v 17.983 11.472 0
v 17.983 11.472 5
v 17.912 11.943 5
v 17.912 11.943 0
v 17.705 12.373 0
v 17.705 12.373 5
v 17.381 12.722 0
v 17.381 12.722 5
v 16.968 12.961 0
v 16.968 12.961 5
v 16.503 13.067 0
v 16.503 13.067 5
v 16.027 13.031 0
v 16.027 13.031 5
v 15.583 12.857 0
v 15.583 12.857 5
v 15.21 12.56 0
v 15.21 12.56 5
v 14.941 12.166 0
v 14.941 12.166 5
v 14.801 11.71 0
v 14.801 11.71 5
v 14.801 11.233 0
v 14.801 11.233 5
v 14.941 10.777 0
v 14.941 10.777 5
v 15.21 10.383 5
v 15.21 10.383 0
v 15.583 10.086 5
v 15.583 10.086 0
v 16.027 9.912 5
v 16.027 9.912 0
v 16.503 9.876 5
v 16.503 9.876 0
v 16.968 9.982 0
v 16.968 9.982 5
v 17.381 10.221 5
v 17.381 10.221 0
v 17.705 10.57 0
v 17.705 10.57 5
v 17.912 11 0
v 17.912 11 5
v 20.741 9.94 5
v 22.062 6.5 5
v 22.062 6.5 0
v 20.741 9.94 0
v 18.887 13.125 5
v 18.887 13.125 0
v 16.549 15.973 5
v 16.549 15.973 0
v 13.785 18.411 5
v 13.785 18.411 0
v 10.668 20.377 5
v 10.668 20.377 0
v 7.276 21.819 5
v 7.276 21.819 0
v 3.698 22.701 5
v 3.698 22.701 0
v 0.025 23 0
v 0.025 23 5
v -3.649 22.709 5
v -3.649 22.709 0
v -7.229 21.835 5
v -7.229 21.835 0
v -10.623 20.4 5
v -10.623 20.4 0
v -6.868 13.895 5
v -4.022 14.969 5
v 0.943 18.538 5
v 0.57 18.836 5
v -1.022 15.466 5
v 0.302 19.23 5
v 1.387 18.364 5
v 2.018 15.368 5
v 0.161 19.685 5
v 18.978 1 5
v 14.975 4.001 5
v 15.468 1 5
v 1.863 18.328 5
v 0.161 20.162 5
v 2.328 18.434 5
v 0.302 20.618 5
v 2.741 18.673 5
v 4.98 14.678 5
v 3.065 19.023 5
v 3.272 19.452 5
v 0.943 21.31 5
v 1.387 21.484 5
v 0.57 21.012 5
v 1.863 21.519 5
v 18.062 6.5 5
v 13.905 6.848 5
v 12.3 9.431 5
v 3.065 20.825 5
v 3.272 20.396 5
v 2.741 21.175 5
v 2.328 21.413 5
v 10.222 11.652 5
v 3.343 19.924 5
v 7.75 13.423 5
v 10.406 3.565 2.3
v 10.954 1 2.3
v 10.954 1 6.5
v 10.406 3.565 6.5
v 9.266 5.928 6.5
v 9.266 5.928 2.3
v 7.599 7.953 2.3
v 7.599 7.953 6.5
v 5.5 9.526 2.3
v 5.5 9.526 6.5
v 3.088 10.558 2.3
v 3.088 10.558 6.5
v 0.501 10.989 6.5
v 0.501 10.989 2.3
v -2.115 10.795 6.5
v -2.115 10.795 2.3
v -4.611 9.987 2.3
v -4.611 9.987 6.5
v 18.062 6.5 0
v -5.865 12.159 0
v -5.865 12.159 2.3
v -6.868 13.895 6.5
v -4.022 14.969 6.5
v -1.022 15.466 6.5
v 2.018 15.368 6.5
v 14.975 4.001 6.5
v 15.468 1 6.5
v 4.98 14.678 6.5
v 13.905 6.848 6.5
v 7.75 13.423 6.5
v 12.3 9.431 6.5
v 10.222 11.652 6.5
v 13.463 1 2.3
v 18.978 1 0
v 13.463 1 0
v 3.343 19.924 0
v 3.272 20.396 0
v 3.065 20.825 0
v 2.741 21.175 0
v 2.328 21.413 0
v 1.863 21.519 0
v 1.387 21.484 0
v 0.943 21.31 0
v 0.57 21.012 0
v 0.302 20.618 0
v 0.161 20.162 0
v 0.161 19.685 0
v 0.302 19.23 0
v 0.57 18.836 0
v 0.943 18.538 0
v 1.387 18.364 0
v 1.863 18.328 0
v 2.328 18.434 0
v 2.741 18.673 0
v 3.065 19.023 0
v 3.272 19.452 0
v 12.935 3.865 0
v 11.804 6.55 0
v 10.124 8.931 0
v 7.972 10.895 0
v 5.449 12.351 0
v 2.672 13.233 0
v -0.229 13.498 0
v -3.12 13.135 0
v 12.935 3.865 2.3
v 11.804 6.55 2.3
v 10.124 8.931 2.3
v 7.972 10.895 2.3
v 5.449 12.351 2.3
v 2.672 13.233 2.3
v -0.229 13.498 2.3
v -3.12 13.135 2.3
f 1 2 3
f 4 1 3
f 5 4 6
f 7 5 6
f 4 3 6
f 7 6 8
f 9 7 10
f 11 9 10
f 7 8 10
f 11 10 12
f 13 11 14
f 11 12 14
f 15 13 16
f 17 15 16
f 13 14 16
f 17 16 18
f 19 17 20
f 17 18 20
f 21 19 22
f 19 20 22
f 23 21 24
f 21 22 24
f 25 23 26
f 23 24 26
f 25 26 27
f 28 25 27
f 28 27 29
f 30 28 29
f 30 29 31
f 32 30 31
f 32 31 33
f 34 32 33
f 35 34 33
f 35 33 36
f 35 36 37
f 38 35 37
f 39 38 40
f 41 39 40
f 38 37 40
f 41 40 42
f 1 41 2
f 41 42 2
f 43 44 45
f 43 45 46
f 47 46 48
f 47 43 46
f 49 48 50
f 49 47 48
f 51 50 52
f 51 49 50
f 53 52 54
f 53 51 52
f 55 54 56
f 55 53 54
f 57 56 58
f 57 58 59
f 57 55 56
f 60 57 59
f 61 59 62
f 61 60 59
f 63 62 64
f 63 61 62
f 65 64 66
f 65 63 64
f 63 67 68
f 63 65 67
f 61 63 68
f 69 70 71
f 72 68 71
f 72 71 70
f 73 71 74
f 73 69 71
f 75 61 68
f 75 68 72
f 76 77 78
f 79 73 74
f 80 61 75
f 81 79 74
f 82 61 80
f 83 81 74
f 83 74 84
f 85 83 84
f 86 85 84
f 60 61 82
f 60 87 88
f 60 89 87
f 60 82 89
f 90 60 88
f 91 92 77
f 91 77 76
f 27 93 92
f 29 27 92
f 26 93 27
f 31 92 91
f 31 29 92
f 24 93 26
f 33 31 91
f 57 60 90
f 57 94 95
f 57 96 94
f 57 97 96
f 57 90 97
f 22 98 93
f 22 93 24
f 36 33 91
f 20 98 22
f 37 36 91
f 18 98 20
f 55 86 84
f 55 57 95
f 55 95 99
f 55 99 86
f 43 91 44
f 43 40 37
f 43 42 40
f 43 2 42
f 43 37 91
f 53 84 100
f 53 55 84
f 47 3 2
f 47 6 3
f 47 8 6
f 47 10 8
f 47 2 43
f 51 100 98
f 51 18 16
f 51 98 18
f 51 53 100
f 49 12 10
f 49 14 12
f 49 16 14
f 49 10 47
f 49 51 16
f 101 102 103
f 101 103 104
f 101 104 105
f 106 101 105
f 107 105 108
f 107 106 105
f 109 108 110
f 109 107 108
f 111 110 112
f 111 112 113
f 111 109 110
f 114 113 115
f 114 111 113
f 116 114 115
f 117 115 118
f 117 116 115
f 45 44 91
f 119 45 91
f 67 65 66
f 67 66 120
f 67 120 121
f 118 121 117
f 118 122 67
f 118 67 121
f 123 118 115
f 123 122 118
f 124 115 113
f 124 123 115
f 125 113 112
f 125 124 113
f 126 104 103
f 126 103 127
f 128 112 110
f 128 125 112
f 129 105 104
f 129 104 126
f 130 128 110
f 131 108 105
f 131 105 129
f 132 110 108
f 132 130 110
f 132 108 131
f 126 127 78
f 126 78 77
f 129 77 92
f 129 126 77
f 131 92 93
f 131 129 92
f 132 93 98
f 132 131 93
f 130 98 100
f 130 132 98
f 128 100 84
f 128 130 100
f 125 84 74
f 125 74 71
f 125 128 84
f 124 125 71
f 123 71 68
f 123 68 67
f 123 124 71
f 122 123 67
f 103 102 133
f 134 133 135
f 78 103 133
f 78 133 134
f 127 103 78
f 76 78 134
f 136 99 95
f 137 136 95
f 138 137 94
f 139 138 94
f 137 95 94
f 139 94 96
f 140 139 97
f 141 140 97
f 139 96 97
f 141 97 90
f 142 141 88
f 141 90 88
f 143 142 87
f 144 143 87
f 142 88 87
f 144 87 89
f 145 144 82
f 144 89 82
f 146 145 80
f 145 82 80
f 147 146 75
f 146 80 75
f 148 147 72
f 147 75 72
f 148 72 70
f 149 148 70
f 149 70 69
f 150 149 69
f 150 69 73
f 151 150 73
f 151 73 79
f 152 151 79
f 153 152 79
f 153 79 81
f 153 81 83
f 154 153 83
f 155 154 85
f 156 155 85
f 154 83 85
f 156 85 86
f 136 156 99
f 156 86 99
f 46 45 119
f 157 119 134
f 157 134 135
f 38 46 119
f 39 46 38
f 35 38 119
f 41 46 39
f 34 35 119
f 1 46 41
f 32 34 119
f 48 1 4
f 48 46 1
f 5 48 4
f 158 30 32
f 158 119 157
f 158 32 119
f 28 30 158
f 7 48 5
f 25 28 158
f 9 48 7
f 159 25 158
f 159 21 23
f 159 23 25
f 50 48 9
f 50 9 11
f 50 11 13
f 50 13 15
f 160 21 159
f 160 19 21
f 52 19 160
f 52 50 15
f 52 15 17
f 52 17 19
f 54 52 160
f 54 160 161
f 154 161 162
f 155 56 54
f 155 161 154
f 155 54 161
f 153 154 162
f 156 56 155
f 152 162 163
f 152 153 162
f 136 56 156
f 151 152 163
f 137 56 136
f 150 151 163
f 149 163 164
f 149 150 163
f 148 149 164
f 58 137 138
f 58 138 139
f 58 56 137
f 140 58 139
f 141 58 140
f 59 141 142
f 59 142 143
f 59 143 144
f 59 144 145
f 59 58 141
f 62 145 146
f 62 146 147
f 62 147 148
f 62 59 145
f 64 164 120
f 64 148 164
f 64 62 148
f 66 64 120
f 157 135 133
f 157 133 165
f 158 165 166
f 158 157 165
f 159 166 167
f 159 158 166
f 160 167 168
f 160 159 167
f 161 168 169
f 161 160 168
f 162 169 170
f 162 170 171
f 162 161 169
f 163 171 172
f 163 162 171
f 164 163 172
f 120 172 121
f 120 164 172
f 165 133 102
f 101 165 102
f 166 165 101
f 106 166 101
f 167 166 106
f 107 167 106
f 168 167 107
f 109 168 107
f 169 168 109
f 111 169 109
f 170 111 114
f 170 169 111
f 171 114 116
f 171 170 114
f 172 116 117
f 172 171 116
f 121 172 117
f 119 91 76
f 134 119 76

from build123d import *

# Parameters (mm, degrees)
F1_ANGLE  = 120
F2_R      = 1.6
F3_DEPTH  = 5
F6_W      = 12.938
F6_H      = 7.452
F7_DEPTH  = 1
F8_W      = 13.007
F8_H      = 7.97
F9_DEPTH  = 1
F11_DEPTH = 5


with BuildPart() as f1:
    # F0 (on Front) → F1 (revolve)
    with BuildSketch(Plane.XZ):
        Polygon((23, 5), (15.5, 5), (15.5, 6.5), (11, 6.5), (11, 2.3), (13.5, 2.3), (13.5, 0), (23, 0), align=None)
    revolve(axis=Axis((0, 0, 3.7848940119), (0, 0, 1)), revolution_arc=F1_ANGLE)

    # F2 (on face) → F3 (cut, through all)
    with BuildSketch(Plane.XY.offset(5)):
        with Locations((1.743114855, 19.9238939618)):
            Circle(F2_R)
        with Locations((16.3830408858, 11.471528727)):
            Circle(F2_R)
    extrude(amount=-F3_DEPTH, mode=Mode.SUBTRACT)

    # F6 (on offset) → F7 (cut, through all)
    with BuildSketch(Plane.XZ.offset(-1)):
        with Locations((17.1259158669, 3.1437808403)):
            Rectangle(F6_W, F6_H)
    extrude(amount=F7_DEPTH, mode=Mode.SUBTRACT)

    # F8 (on offset) → F9 (cut, through all)
    with BuildSketch(Plane(origin=(0.8660254038, 0.5, 0), x_dir=(0.5, -0.8660254038, 0), z_dir=(-0.8660254038, -0.5, 0))):
        with Locations((-17.1034485545, 3.2673813227)):
            Rectangle(F8_W, F8_H)
    extrude(amount=F9_DEPTH, mode=Mode.SUBTRACT)

    # F10 (on face) → F11 (cut, through all)
    with BuildSketch(Plane.XY.offset(5)):
        with BuildLine():
            Line((18.9782505862, 1), (22.9782505862, 1))
            ThreePointArc((22.9782505862, 1), (22.6876135739, 3.777855254), (22.0624114729, 6.5))
            Line((22.0624114729, 6.5), (18.0624114729, 6.5))
            Line((18.0624114729, 6.5), (18.9782505862, 1))
        make_face()
        with BuildLine():
            ThreePointArc((22.0624114729, 6.5), (22.6876135739, 3.777855254), (22.9782505862, 1))
            Line((22.9782505862, 1), (23.6873179674, 0.9982389165))
            Line((23.6873179674, 0.9982389165), (23.6873179674, 6.5))
            Line((23.6873179674, 6.5), (22.0624114729, 6.5))
        make_face()
    extrude(amount=-F11_DEPTH, mode=Mode.SUBTRACT)


solid = f1.part
